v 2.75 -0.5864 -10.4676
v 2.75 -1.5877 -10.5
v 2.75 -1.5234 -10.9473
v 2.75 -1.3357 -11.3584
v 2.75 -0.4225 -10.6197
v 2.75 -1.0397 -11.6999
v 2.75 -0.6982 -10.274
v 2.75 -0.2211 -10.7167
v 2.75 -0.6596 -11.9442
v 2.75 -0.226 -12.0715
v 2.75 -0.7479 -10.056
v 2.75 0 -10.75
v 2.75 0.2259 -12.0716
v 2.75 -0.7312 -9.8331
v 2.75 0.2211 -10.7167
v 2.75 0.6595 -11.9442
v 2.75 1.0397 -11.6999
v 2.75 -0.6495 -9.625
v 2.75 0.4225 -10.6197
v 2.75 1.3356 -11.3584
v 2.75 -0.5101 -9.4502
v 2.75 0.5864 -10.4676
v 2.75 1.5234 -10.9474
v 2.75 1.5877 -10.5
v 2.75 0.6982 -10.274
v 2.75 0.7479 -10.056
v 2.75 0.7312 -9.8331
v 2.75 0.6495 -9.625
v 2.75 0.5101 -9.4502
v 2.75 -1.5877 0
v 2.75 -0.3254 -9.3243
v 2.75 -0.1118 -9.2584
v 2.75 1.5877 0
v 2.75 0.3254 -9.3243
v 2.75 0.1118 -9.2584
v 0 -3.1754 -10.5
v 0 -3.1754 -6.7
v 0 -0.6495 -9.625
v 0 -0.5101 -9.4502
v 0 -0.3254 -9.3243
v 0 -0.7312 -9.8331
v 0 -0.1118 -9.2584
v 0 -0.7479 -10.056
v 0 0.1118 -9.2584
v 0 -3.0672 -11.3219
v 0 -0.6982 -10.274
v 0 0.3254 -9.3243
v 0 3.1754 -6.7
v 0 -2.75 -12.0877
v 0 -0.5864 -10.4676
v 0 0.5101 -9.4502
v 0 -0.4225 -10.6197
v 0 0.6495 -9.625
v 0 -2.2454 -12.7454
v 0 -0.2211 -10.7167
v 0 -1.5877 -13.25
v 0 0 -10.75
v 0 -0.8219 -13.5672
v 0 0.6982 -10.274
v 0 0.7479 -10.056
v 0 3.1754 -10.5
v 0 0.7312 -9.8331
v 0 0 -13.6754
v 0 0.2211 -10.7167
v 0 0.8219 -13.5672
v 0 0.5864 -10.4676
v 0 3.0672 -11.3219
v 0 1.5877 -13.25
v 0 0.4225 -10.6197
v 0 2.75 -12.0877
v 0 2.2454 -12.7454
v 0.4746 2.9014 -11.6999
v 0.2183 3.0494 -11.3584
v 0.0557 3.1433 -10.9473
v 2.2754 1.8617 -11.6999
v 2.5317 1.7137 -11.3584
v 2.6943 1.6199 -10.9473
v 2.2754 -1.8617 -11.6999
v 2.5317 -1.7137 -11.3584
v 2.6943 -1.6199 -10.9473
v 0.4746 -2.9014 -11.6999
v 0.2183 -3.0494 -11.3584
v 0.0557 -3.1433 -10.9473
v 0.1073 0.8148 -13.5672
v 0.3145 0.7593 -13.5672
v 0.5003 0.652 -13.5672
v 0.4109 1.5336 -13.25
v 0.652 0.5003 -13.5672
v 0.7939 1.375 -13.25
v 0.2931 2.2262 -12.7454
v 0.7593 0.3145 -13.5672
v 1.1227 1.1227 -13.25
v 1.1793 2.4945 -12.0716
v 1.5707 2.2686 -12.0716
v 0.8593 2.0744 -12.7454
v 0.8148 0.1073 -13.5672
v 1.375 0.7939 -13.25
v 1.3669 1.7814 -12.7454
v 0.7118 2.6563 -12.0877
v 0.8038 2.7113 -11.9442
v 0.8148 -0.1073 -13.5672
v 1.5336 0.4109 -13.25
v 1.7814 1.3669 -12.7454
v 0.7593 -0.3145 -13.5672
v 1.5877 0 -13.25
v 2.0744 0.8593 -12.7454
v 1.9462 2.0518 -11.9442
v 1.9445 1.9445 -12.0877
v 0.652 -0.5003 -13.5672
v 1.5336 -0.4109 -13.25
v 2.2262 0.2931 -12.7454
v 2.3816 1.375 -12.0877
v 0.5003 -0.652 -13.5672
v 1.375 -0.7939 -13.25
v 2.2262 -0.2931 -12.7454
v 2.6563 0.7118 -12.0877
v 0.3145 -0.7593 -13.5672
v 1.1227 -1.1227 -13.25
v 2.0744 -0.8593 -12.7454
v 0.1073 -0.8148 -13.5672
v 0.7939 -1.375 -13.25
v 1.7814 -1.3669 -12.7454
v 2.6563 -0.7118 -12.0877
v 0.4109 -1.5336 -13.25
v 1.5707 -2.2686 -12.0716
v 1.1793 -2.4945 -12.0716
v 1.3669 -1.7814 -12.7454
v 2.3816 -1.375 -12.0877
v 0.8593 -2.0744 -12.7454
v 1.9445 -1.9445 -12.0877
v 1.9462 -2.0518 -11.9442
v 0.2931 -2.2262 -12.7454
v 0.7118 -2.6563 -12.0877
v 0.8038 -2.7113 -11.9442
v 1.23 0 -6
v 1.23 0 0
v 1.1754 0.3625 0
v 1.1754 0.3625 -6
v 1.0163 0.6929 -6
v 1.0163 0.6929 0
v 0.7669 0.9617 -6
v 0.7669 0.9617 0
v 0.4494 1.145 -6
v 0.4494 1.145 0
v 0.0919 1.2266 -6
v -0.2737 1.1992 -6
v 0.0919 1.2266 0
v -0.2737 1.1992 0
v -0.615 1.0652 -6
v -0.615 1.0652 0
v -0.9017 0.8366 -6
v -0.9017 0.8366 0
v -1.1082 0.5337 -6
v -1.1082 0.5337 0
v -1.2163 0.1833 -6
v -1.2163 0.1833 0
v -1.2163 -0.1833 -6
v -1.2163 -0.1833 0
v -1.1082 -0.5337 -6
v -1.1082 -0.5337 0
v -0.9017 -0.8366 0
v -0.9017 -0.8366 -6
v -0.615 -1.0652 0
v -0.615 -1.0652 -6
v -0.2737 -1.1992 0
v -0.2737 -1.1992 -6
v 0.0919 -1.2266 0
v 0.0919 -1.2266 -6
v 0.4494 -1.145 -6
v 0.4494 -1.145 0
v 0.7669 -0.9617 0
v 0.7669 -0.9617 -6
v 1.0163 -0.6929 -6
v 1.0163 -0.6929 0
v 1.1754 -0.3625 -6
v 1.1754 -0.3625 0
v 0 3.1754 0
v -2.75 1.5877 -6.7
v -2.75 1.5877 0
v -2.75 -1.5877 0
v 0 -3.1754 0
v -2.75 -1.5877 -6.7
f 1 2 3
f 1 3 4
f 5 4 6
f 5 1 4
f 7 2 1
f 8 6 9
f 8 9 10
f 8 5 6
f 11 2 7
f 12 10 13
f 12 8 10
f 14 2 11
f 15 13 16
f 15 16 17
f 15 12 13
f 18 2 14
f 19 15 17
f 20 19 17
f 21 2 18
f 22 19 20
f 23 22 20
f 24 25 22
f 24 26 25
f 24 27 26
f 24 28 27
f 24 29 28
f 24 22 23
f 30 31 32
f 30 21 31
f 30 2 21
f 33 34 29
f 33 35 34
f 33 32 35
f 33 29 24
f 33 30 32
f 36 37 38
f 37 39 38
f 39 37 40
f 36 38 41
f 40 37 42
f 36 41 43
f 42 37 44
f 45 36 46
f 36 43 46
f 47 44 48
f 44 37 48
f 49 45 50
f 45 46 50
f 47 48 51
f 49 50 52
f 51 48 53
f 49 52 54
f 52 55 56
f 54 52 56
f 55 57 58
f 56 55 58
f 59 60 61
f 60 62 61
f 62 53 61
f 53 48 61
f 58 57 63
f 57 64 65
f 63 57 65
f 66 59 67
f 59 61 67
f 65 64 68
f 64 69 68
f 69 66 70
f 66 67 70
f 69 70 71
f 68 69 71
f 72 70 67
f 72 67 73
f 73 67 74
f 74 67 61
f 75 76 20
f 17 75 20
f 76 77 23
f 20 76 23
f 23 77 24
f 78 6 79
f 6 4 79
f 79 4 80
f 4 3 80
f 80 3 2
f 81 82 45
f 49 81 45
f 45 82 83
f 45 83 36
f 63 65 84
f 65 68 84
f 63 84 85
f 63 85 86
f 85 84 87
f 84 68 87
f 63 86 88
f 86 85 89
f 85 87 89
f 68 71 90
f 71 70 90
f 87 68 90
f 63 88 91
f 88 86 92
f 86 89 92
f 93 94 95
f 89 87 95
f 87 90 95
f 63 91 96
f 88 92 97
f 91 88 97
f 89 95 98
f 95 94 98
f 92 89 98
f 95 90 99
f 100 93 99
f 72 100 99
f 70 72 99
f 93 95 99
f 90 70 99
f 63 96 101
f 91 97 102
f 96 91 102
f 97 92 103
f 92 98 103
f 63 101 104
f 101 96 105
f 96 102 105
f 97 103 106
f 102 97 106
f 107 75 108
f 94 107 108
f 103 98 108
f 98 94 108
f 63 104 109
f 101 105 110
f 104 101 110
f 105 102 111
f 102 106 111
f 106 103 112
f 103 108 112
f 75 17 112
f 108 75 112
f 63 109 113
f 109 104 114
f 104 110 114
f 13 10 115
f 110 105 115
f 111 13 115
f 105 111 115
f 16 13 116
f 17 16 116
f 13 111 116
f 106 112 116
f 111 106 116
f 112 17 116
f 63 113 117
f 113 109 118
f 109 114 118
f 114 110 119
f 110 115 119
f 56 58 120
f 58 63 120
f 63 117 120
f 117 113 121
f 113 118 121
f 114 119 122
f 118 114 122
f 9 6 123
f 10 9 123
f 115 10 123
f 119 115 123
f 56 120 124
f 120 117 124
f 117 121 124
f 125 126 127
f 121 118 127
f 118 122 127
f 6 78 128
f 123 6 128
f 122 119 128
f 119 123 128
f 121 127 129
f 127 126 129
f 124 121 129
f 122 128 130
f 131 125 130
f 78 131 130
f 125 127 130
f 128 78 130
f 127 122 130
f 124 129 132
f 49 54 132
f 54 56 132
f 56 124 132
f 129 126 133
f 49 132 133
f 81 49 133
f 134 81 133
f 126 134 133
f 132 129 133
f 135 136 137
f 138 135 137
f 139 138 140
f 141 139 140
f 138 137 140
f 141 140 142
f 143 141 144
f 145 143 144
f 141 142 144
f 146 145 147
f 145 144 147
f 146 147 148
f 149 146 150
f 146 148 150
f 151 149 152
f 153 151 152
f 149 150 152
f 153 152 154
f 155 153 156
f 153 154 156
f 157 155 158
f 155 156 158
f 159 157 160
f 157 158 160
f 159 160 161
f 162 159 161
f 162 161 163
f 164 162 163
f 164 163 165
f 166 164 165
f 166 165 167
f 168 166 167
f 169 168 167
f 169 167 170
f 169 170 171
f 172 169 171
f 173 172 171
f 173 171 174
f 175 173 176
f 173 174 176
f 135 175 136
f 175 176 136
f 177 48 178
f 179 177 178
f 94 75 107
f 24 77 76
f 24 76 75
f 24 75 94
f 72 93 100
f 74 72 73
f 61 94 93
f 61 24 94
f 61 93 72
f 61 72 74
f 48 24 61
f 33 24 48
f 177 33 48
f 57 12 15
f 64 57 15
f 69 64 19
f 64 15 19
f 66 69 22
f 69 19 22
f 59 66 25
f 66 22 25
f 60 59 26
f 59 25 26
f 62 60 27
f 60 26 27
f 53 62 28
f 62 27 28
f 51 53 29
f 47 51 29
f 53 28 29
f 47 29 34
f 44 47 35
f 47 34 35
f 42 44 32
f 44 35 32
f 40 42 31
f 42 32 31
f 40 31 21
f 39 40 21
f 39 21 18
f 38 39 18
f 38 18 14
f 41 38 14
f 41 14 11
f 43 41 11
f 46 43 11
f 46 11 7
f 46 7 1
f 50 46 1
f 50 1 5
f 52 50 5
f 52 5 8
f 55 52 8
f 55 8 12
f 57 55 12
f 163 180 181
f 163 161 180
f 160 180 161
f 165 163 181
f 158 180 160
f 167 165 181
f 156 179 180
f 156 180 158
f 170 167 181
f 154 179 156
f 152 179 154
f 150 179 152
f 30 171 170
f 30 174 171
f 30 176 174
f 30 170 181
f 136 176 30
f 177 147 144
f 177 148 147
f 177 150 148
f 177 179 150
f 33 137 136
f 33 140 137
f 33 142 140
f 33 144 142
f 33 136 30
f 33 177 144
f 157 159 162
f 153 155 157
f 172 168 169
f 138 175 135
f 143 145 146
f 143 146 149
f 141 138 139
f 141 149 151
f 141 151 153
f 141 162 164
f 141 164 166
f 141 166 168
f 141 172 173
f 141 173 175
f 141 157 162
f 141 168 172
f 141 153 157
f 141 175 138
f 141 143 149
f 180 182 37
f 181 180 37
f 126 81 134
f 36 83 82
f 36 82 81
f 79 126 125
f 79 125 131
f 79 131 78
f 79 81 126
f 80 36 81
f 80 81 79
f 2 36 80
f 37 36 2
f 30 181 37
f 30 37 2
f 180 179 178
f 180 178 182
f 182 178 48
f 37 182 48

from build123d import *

# Parameters (mm, degrees)
AUFSATZ_LINEAR_AUSTRAGEN1_DEPTH      = 15
SKIZZE1_3_OUTSIDE_W                  = 10.938
SKIZZE1_3_OUTSIDE_H                  = 11.788
SKIZZE1_3_OUTSIDE_R                  = 1.23
SCHNITT_LINEAR_AUSTRAGEN3_DEPTH      = 6
SKIZZE3_R                            = 0.75
SCHNITT_LINEAR_AUSTRAGEN1_DEPTH      = 16.078150509
SCHNITT_LINEAR_AUSTRAGEN2_DEPTH      = 15.306051963
SCHNITT_LINEAR_AUSTRAGEN2_DEPTH_BACK = 15.306051963
SKIZZE4_W                            = 2.75
SKIZZE4_H                            = 6.975426481


with BuildPart() as part:
    # Skizze1 → Aufsatz-Linear austragen1 (new body)
    with BuildSketch(Plane.XY):
        Polygon((-2.75, 1.58771324), (-2.75, -1.58771324), (0, -3.175426481), (2.75, -1.58771324), (2.75, 1.58771324), (0, 3.175426481), align=None)
    extrude(amount=-AUFSATZ_LINEAR_AUSTRAGEN1_DEPTH)

    # Skizze1<3> outside → Schnitt-Linear austragen3 (cut)
    # profile 1 of 2: a face of its own
    with BuildSketch(Plane.XY):
        Rectangle(SKIZZE1_3_OUTSIDE_W, SKIZZE1_3_OUTSIDE_H)
        Polygon((-2.75, 1.58771324), (-2.75, -1.58771324), (0, -3.175426481), (2.75, -1.58771324), (2.75, 1.58771324), (0, 3.175426481), align=None, mode=Mode.SUBTRACT)
    # profile 2 of 2: a face of its own
    with BuildSketch(Plane.XY):
        Circle(SKIZZE1_3_OUTSIDE_R)
    extrude(amount=-SCHNITT_LINEAR_AUSTRAGEN3_DEPTH, mode=Mode.SUBTRACT)

    # Skizze2 → Schnitt-Rotation1 (revolve, cut)
    with BuildSketch(Plane(origin=(0, 0, 0), x_dir=(0, 0, -1), z_dir=(1, 0, 0))):
        with BuildLine():
            Line((10.5, 3.175426481), (10.5, 5))
            Line((10.5, 5), (15, 5))
            Line((15, 5), (15, 0))
            Line((15, 0), (13.675426481, 0))
            ThreePointArc((13.675426481, 0), (12.745365598, 2.245365598), (10.5, 3.175426481))
        make_face()
    revolve(axis=Axis((0, 0, 0), (0, 0, -1)), mode=Mode.SUBTRACT)

    # Skizze3 → Schnitt-Linear austragen1 (cut, through all)
    with BuildSketch(Plane(origin=(2.75, 0, 0), x_dir=(0, 0, -1), z_dir=(1, 0, 0))):
        with Locations((10, 0)):
            Circle(SKIZZE3_R)
    extrude(amount=-SCHNITT_LINEAR_AUSTRAGEN1_DEPTH, mode=Mode.SUBTRACT)

    # Skizze4 → Schnitt-Linear austragen2 (cut, two sides: drawn at the far end of the back side and taken through both)
    with BuildSketch(Plane(origin=(0, 0, 0), x_dir=(1, 0, 0), z_dir=(0, 1, 0)).offset(-SCHNITT_LINEAR_AUSTRAGEN2_DEPTH_BACK)):
        with Locations((-1.375, 10.187713241)):
            Rectangle(SKIZZE4_W, SKIZZE4_H)
    extrude(amount=SCHNITT_LINEAR_AUSTRAGEN2_DEPTH + SCHNITT_LINEAR_AUSTRAGEN2_DEPTH_BACK, mode=Mode.SUBTRACT)


solid = part.part
